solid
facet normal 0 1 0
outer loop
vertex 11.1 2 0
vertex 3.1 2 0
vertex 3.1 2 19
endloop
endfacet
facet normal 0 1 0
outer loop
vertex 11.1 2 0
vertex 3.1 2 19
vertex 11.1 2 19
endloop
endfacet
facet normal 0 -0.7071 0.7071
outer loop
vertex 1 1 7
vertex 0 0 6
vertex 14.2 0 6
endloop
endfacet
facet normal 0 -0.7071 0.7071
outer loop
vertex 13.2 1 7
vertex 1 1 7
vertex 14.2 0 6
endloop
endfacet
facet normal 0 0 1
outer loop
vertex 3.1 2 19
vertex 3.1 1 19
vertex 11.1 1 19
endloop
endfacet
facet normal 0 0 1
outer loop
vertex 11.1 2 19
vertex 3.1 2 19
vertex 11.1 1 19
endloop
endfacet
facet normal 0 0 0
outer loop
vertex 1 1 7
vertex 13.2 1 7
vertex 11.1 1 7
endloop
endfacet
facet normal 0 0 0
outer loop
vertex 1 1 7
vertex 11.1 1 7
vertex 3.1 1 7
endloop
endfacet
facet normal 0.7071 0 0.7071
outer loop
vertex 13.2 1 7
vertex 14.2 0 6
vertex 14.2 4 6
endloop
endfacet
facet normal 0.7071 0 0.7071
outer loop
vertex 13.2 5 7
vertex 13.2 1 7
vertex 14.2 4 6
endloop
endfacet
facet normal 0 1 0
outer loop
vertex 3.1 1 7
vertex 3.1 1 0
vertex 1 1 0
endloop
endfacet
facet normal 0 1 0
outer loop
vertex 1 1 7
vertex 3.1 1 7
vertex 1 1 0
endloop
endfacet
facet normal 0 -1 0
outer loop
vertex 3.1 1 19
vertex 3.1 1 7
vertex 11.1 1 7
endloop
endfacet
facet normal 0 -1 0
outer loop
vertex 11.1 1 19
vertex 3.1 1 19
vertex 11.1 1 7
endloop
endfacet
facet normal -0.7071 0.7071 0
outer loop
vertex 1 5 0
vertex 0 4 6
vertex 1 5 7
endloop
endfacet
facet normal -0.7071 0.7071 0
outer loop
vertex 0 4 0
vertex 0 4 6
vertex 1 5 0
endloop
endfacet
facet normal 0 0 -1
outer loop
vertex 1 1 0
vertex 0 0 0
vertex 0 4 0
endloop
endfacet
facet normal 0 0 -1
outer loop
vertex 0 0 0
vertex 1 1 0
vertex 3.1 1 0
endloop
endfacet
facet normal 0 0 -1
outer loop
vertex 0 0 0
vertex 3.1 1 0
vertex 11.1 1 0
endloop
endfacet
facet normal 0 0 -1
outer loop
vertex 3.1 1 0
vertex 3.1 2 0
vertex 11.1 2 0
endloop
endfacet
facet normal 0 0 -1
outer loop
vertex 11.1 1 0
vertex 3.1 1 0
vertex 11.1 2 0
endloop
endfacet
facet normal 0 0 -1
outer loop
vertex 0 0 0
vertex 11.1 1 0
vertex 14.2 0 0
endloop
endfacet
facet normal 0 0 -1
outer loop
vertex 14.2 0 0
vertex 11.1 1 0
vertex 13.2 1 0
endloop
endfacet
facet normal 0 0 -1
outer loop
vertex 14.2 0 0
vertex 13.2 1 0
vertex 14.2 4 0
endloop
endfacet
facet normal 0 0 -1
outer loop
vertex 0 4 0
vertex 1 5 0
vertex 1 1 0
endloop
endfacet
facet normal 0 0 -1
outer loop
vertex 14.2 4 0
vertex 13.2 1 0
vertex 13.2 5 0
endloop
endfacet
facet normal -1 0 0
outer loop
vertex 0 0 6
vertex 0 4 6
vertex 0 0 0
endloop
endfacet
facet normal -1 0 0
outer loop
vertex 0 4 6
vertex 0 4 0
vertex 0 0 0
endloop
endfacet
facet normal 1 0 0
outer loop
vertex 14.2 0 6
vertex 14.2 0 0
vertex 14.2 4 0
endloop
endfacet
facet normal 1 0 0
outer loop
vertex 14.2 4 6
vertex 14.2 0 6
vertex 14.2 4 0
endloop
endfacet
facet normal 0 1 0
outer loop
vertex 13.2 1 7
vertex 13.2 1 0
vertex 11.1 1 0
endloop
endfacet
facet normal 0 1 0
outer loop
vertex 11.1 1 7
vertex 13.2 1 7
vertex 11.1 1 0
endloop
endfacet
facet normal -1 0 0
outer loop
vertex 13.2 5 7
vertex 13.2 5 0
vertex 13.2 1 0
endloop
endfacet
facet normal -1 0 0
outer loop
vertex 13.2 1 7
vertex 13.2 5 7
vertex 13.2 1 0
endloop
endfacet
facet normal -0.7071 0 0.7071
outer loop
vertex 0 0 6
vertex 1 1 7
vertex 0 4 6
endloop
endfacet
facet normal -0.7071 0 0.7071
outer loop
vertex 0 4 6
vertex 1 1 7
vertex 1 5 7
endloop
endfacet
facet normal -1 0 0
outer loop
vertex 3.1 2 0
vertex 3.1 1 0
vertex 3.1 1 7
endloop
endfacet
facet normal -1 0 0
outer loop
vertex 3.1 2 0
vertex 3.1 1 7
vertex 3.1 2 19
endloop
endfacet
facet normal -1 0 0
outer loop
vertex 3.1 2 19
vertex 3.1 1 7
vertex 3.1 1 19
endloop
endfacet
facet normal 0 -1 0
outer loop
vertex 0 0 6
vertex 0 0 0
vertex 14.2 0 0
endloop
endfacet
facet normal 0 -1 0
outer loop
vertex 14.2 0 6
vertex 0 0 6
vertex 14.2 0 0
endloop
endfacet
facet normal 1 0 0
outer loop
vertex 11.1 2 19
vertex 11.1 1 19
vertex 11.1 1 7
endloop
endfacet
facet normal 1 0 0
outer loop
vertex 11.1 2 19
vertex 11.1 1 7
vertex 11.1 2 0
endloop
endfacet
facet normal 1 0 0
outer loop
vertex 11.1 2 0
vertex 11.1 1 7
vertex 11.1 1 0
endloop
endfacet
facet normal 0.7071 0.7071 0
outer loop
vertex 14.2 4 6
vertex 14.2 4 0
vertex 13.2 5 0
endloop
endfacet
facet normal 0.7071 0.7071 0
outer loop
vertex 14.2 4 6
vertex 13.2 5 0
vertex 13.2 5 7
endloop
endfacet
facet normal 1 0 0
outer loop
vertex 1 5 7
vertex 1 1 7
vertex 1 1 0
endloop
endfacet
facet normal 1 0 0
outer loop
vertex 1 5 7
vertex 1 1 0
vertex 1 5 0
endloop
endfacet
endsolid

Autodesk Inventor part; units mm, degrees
ref_plane "YZ Plane" through (0, 0, 0) normal (1, 0, 0) x (0, 1, 0)
ref_plane "XZ Plane" through (0, 0, 0) normal (0, 1, 0) x (-1, 0, 0)
ref_plane "XY Plane" through (0, 0, 0) normal (0, 0, 1) x (1, 0, 0)
sketch "스케치1" plane through (0, 0, 0) normal (0, 0, 1) x (1, 0, 0)
  line L0 (0, 5) -> (0, 0)
  line L1 (0, 0) -> (15.1186, 0)
  line L2 (0, 0) -> (14.2, 0)
  line L3 (14.2, 0) -> (14.2, 5)
  line L4 (14.2, 5) -> (13.2, 5)
  line L5 (13.2, 5) -> (13.2, 1)
  line L6 (13.2, 1) -> (1, 1)
  line L7 (1, 1) -> (1, 5)
  line L8 (1, 5) -> (0, 5)
  dimension "t" = 1
  dimension "d1" = 1
  dimension "d2" = 1
  dimension "d3" = 12.2
  dimension "d4" = 4
extrude "돌출1" add sketch "스케치1" along normal blind 7
sketch "스케치2" plane through (1, 1, 0) normal (0, 1, 0) x (1, 0, 0)
  line L0 (12.2, 0) -> (0, 0) projected
  line L1 (0, 0) -> (0, -7) projected
  line L2 (12.2, 0) -> (12.2, -7) projected
  line L3 (10.1, 0) -> (2.1, 0)
  line L4 (2.1, 0) -> (2.1, -19)
  line L5 (2.1, -19) -> (10.1, -19)
  line L6 (10.1, -19) -> (10.1, 0)
  point P0 (-1, 0)
  point P1 (2.1, 0)
  dimension "d7" = 2.1
  dimension "d8" = 19
  dimension "d9" = 2.1
extrude "돌출2" add sketch "스케치2" along normal blind 1
chamfer "모따기1" distance 1 angle 45 5 edges at (14.2, 5, 3.5) (7.1, 0, 7) (0, 5, 3.5) (14.2, 2.5, 7) (0, 2.5, 7)
equation "\"d1\" = t"
equation "\"d2\" = t"
properties part number "_3D 인쇄"
